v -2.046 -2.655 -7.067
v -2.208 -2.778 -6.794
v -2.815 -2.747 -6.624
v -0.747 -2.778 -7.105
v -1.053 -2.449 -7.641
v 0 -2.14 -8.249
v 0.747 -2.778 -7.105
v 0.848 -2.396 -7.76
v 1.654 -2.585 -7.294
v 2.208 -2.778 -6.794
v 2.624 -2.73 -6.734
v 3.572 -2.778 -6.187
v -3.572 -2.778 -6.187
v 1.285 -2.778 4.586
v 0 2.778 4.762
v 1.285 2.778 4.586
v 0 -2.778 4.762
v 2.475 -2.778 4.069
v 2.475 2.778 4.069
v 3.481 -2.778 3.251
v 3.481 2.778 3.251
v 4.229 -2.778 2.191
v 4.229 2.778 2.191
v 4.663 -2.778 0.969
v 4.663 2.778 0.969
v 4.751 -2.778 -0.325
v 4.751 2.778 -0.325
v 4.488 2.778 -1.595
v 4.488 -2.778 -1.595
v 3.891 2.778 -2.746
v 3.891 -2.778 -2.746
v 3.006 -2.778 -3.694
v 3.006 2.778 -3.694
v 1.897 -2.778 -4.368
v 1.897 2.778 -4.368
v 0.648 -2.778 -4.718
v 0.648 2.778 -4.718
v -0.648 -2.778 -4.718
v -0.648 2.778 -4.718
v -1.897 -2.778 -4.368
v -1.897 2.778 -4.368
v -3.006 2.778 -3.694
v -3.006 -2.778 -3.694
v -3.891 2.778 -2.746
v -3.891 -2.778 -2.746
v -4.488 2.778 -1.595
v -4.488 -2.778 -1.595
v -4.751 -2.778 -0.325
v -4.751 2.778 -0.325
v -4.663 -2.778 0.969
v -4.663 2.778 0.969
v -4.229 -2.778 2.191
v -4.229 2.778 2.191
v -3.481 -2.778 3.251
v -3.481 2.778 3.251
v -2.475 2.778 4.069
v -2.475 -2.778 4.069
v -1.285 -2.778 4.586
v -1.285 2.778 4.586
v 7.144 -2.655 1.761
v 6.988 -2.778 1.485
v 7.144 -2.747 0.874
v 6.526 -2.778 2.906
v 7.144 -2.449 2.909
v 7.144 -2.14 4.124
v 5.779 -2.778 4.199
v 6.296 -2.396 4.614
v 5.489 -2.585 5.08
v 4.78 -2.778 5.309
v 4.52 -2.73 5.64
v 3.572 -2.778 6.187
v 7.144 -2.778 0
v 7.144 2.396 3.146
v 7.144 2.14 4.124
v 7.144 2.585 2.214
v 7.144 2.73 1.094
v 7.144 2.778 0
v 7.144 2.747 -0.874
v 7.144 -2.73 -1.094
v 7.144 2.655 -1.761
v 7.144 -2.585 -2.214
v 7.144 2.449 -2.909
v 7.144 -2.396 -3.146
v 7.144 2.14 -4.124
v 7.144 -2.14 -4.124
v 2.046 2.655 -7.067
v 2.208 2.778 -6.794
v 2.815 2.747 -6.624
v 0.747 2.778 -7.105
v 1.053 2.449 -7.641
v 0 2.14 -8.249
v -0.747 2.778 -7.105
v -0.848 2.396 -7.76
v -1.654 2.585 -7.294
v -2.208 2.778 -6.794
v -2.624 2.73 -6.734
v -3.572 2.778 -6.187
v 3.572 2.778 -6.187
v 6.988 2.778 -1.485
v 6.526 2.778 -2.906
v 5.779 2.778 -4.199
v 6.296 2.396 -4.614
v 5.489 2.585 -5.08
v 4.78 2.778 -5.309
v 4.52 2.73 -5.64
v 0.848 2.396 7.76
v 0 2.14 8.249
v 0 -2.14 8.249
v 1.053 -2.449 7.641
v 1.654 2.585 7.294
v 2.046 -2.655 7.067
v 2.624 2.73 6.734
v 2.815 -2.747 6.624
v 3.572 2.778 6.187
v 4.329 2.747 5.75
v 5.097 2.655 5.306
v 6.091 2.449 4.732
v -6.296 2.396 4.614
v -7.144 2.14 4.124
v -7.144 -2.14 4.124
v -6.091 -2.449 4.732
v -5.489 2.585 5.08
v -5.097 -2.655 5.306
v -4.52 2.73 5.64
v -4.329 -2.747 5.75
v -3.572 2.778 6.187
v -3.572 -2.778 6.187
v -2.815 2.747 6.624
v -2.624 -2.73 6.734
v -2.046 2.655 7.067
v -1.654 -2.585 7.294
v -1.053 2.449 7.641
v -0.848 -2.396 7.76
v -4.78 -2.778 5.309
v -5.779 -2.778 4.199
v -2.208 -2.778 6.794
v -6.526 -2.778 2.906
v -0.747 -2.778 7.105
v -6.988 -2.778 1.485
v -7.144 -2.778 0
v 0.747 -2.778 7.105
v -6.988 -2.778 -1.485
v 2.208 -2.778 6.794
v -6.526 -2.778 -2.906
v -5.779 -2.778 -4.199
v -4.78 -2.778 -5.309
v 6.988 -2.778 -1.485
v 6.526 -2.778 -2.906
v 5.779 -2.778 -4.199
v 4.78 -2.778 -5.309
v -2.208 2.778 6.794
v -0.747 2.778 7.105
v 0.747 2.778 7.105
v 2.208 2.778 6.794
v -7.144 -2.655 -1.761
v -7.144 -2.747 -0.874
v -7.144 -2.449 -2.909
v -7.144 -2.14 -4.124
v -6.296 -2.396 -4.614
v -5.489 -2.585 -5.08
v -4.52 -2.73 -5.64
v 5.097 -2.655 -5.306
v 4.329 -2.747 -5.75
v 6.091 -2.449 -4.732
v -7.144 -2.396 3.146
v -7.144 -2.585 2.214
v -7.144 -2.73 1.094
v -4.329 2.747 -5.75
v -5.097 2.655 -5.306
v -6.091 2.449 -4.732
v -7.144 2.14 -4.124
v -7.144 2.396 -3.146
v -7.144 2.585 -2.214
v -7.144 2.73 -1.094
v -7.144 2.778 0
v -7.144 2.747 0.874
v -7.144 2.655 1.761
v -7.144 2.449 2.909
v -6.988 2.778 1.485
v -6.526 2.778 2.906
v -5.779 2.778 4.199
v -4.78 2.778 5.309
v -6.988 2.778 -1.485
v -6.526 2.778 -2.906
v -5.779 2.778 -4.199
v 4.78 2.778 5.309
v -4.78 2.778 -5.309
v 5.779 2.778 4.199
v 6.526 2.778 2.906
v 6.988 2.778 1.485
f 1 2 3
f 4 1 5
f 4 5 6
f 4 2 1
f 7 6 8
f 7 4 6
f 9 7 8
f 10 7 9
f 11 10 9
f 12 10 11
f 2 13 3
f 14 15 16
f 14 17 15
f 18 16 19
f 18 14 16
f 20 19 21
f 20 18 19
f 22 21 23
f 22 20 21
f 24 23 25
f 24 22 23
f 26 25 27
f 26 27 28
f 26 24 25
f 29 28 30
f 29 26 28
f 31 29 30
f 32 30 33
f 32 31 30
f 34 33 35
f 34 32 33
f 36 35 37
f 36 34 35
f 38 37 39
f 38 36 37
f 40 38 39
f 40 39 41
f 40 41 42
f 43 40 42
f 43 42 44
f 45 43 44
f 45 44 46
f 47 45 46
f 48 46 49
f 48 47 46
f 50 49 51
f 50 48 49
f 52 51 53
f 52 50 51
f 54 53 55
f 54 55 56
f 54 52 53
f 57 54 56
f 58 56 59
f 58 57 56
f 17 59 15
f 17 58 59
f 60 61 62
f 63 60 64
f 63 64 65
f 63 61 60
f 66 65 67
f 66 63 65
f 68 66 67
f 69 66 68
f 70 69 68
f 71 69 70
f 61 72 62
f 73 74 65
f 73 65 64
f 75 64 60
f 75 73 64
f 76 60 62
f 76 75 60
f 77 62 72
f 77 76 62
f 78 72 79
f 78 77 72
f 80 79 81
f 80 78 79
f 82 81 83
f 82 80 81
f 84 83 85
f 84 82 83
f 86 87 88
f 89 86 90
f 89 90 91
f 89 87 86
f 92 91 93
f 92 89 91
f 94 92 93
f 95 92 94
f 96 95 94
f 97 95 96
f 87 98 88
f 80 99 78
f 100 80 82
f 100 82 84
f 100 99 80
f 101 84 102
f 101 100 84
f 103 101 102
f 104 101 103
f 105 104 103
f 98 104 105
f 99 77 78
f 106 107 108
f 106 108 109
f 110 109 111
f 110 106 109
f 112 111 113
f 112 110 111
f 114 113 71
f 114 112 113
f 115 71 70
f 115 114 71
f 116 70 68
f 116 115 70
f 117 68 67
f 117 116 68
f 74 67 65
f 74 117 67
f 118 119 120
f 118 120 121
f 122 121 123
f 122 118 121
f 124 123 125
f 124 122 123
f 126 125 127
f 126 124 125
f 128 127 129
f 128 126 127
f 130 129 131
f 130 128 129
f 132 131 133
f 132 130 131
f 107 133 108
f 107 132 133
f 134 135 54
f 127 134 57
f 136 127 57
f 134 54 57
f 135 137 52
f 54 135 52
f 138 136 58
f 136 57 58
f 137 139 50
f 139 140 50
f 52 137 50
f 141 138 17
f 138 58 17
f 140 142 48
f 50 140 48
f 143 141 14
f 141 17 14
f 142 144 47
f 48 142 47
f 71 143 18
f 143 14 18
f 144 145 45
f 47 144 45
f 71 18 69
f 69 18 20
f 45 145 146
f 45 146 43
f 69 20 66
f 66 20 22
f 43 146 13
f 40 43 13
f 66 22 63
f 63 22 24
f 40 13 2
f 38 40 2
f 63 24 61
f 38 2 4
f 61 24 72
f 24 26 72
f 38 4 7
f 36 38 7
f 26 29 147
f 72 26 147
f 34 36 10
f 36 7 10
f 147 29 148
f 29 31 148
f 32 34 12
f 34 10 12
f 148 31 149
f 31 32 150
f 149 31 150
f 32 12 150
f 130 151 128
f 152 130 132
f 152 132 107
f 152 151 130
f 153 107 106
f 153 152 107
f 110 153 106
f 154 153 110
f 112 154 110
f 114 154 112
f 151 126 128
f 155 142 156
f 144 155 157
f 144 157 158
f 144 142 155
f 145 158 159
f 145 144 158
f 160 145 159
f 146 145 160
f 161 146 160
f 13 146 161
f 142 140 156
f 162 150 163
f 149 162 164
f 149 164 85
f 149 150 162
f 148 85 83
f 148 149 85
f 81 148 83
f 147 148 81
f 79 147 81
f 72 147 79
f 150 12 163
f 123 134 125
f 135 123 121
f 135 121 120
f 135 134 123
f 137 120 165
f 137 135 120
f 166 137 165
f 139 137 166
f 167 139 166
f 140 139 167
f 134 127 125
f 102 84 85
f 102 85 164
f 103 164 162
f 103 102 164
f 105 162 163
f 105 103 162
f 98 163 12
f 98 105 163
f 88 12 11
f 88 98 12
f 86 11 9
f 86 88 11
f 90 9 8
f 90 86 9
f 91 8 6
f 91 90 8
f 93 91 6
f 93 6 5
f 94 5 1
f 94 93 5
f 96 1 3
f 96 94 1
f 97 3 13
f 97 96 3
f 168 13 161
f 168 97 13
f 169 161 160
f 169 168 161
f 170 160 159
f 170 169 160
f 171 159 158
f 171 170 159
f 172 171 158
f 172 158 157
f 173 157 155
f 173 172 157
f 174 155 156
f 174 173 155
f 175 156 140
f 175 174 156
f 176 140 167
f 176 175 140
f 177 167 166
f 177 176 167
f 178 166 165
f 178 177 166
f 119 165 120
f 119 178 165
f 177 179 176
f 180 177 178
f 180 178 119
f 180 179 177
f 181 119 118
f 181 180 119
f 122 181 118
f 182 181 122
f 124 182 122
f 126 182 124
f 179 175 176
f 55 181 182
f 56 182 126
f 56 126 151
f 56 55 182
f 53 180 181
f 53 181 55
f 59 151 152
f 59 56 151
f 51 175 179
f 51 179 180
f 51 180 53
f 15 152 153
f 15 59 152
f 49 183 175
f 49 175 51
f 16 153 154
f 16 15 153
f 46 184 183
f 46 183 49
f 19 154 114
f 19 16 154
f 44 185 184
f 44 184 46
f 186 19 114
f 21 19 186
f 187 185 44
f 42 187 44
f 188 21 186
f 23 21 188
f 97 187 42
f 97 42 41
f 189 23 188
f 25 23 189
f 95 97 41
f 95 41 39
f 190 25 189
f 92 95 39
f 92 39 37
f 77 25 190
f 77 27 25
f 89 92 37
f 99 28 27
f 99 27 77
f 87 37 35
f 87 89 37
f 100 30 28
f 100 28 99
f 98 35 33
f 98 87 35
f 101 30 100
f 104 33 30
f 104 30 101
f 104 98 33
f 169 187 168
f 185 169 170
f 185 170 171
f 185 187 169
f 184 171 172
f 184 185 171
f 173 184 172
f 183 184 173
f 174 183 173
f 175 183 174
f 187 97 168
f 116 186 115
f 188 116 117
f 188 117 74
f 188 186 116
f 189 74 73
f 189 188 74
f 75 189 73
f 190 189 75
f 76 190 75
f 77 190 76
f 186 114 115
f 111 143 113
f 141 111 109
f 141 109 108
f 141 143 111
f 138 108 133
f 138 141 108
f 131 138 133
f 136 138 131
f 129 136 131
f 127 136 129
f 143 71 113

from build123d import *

# Parameters (mm, degrees)
SKETCH1_R               = 4.7625
BOSS_EXTRUDE1_DEPTH     = 2.778125
SKETCH5_OUTSIDE_W       = 66.676
SKETCH5_OUTSIDE_H       = 68.886
SKETCH5_OUTSIDE_R       = 7.14375
CUT_EXTRUDE2_DEPTH      = 13.245378593
CUT_EXTRUDE2_DRAFT      = -60
MIRROR1_COPY_1_SKETCH_W = 66.676
MIRROR1_COPY_1_SKETCH_H = 68.886
MIRROR1_COPY_1_SKETCH_R = 7.14375
MIRROR1_COPY_1_DEPTH    = 13.245378593
MIRROR1_COPY_1_DRAFT    = -60


with BuildPart() as part:
    # Sketch1 → Boss-Extrude1 (new, symmetric)
    with BuildSketch(Plane(origin=(0, 0, 0), x_dir=(1, 0, 0), z_dir=(0, 1, 0))):
        Polygon((-7.14375, 4.124445986), (-7.14375, -4.124445986), (0, -8.248891971), (7.14375, -4.124445986), (7.14375, 4.124445986), (0, 8.248891971), align=None)
        Circle(SKETCH1_R, mode=Mode.SUBTRACT)
    extrude(amount=BOSS_EXTRUDE1_DEPTH, both=True)


with BuildPart() as cut_extrude2_tool:
    # Sketch5 outside → Cut-Extrude2 (with draft: the straight prism first)
    with BuildSketch(Plane(origin=(0, 2.778125, 0), x_dir=(1, 0, 0), z_dir=(0, 1, 0))):
        Rectangle(SKETCH5_OUTSIDE_W, SKETCH5_OUTSIDE_H)
        Circle(SKETCH5_OUTSIDE_R, mode=Mode.SUBTRACT)
    extrude(amount=-CUT_EXTRUDE2_DEPTH)
    # Cut-Extrude2: the draft: its side faces are tilted about the plane it starts from
    cut_extrude2_sides = [cut_extrude2_tool.faces().sort_by_distance(p)[0] for p in [
        (0, -3.844564296, 34.443),
        (33.338, -3.844564296, 0),
        (0, -3.844564296, -34.443),
        (-33.338, -3.844564296, 0),
        (-7.14375, -3.844564296, 0),
    ]]
    draft(cut_extrude2_sides, Plane(origin=(0, 2.778125, 0), x_dir=(1, 0, 0), z_dir=(0, 1, 0)), CUT_EXTRUDE2_DRAFT)


with BuildPart() as part_1:
    add(part.part)

    # Cut-Extrude2: cut by cut_extrude2_tool
    add(cut_extrude2_tool.part, mode=Mode.SUBTRACT)


with BuildPart() as mirror1_copy_1_tool:
    # Mirror1 copy 1 sketch → Mirror1 copy 1 (with draft: the straight prism first)
    with BuildSketch(Plane.XZ.offset(2.778125)):
        Rectangle(MIRROR1_COPY_1_SKETCH_W, MIRROR1_COPY_1_SKETCH_H)
        Circle(MIRROR1_COPY_1_SKETCH_R, mode=Mode.SUBTRACT)
    extrude(amount=-MIRROR1_COPY_1_DEPTH)
    # Mirror1 copy 1: the draft: its side faces are tilted about the plane it starts from
    mirror1_copy_1_sides = [mirror1_copy_1_tool.faces().sort_by_distance(p)[0] for p in [
        (0, 3.844564296, 34.443),
        (33.338, 3.844564296, 0),
        (0, 3.844564296, -34.443),
        (-33.338, 3.844564296, 0),
        (-7.14375, 3.844564296, 0),
    ]]
    draft(mirror1_copy_1_sides, Plane.XZ.offset(2.778125), MIRROR1_COPY_1_DRAFT)


with BuildPart() as part_2:
    add(part_1.part)

    # Mirror1 copy 1: cut by mirror1_copy_1_tool
    add(mirror1_copy_1_tool.part, mode=Mode.SUBTRACT)


solid = part_2.part
